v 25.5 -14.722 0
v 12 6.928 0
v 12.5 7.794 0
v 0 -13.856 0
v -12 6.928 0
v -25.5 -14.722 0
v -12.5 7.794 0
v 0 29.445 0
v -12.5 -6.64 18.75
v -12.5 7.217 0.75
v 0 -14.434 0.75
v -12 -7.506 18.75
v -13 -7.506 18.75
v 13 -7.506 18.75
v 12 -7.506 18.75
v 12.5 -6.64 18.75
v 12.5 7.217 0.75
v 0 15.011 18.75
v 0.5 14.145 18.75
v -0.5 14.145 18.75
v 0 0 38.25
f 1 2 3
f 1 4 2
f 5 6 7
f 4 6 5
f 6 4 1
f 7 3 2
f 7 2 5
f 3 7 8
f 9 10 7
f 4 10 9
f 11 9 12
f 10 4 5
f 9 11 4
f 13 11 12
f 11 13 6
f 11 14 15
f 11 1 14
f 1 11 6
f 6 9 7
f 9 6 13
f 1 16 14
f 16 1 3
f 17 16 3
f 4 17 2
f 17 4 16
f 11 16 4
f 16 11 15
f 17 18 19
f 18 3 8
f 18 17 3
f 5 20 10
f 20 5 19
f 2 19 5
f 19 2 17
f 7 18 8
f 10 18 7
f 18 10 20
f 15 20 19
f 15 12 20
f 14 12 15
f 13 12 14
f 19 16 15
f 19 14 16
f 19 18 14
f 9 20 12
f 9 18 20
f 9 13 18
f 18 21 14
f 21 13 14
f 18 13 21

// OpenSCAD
SIDE = 50;
OVERLAP = 1;

module tetra_fractal(side, depth=1) {
  h2 = side * sin(60);
  h3 = h2 * sin(60);
  if (depth == 1) {
    translate([-side/2, -h2/3, 0])
    polyhedron(
      points=[[0, 0, 0], [side, 0, 0], [side/2, h2, 0],
            [side/2, h2/3, h3]],
      triangles=[[0, 1, 2], [0, 3, 1], [1, 3, 2], [2, 3, 0]]
    );
  } else {
    translate([-side/4, -h2/6, 0])
      tetra_fractal(side/2 + OVERLAP, depth - 1);
    translate([side/4, -h2/6, 0])
      tetra_fractal(side/2 + OVERLAP, depth - 1);
    translate([0, h2/3, 0])
      tetra_fractal(side/2 + OVERLAP, depth - 1);
    translate([0, 0, h3/2])
      tetra_fractal(side/2 + OVERLAP, depth - 1);
  }
}

tetra_fractal(SIDE, 2);
